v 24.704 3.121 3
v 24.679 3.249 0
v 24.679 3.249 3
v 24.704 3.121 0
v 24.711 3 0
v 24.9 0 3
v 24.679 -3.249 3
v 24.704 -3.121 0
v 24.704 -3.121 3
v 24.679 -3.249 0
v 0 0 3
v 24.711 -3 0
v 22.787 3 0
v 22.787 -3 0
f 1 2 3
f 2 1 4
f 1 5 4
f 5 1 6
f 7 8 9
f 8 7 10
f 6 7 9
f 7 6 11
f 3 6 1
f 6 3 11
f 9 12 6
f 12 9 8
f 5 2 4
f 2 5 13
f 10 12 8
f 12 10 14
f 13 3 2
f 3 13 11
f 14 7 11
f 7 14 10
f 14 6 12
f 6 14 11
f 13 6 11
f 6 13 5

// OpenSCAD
// file: cylinder_section.scad
// Provides a section of a cylinder (like a pie), height is in Z, and the
// section is centered on X
//
// The origin of the object is in the center of the cylinder, at the bottom of
// it
module CylinderSection(height, diameter, angle) {
    difference() {
        cylinder(h=height, d=diameter, center=false);
        rotate([0,0,angle/2])
            translate([-(diameter+1)/2,0,-0.5])
                cube([diameter+1,diameter+1,height+1]);
        rotate([0,0,180-angle/2])
            translate([-(diameter+1)/2,0,-0.5])
                cube([diameter+1,diameter+1,height+1]);
    }
}

// Provides roof supports in case you use a CylinderSection to make a cutout on
// a model
//
// The origin of the object is where the origin of the CylinderSection with the
// same parameters would be
module CylinderSectionCutoutRoofSupport(height, diameter, angle) {
    longest_dimension = angle*diameter*PI/720 + height;
    difference() {
        CylinderSection(height, diameter, angle);
        translate([0,0,height])
            rotate([225,0,0])
                cube([diameter/2+1, longest_dimension, longest_dimension]);
    }
}
// main file
use <cylinder_section.scad>

$fn=50;
// CylinderSection(height=5, diameter=20, angle=45);

CylinderSectionCutoutRoofSupport(3,49.8,360/24);
